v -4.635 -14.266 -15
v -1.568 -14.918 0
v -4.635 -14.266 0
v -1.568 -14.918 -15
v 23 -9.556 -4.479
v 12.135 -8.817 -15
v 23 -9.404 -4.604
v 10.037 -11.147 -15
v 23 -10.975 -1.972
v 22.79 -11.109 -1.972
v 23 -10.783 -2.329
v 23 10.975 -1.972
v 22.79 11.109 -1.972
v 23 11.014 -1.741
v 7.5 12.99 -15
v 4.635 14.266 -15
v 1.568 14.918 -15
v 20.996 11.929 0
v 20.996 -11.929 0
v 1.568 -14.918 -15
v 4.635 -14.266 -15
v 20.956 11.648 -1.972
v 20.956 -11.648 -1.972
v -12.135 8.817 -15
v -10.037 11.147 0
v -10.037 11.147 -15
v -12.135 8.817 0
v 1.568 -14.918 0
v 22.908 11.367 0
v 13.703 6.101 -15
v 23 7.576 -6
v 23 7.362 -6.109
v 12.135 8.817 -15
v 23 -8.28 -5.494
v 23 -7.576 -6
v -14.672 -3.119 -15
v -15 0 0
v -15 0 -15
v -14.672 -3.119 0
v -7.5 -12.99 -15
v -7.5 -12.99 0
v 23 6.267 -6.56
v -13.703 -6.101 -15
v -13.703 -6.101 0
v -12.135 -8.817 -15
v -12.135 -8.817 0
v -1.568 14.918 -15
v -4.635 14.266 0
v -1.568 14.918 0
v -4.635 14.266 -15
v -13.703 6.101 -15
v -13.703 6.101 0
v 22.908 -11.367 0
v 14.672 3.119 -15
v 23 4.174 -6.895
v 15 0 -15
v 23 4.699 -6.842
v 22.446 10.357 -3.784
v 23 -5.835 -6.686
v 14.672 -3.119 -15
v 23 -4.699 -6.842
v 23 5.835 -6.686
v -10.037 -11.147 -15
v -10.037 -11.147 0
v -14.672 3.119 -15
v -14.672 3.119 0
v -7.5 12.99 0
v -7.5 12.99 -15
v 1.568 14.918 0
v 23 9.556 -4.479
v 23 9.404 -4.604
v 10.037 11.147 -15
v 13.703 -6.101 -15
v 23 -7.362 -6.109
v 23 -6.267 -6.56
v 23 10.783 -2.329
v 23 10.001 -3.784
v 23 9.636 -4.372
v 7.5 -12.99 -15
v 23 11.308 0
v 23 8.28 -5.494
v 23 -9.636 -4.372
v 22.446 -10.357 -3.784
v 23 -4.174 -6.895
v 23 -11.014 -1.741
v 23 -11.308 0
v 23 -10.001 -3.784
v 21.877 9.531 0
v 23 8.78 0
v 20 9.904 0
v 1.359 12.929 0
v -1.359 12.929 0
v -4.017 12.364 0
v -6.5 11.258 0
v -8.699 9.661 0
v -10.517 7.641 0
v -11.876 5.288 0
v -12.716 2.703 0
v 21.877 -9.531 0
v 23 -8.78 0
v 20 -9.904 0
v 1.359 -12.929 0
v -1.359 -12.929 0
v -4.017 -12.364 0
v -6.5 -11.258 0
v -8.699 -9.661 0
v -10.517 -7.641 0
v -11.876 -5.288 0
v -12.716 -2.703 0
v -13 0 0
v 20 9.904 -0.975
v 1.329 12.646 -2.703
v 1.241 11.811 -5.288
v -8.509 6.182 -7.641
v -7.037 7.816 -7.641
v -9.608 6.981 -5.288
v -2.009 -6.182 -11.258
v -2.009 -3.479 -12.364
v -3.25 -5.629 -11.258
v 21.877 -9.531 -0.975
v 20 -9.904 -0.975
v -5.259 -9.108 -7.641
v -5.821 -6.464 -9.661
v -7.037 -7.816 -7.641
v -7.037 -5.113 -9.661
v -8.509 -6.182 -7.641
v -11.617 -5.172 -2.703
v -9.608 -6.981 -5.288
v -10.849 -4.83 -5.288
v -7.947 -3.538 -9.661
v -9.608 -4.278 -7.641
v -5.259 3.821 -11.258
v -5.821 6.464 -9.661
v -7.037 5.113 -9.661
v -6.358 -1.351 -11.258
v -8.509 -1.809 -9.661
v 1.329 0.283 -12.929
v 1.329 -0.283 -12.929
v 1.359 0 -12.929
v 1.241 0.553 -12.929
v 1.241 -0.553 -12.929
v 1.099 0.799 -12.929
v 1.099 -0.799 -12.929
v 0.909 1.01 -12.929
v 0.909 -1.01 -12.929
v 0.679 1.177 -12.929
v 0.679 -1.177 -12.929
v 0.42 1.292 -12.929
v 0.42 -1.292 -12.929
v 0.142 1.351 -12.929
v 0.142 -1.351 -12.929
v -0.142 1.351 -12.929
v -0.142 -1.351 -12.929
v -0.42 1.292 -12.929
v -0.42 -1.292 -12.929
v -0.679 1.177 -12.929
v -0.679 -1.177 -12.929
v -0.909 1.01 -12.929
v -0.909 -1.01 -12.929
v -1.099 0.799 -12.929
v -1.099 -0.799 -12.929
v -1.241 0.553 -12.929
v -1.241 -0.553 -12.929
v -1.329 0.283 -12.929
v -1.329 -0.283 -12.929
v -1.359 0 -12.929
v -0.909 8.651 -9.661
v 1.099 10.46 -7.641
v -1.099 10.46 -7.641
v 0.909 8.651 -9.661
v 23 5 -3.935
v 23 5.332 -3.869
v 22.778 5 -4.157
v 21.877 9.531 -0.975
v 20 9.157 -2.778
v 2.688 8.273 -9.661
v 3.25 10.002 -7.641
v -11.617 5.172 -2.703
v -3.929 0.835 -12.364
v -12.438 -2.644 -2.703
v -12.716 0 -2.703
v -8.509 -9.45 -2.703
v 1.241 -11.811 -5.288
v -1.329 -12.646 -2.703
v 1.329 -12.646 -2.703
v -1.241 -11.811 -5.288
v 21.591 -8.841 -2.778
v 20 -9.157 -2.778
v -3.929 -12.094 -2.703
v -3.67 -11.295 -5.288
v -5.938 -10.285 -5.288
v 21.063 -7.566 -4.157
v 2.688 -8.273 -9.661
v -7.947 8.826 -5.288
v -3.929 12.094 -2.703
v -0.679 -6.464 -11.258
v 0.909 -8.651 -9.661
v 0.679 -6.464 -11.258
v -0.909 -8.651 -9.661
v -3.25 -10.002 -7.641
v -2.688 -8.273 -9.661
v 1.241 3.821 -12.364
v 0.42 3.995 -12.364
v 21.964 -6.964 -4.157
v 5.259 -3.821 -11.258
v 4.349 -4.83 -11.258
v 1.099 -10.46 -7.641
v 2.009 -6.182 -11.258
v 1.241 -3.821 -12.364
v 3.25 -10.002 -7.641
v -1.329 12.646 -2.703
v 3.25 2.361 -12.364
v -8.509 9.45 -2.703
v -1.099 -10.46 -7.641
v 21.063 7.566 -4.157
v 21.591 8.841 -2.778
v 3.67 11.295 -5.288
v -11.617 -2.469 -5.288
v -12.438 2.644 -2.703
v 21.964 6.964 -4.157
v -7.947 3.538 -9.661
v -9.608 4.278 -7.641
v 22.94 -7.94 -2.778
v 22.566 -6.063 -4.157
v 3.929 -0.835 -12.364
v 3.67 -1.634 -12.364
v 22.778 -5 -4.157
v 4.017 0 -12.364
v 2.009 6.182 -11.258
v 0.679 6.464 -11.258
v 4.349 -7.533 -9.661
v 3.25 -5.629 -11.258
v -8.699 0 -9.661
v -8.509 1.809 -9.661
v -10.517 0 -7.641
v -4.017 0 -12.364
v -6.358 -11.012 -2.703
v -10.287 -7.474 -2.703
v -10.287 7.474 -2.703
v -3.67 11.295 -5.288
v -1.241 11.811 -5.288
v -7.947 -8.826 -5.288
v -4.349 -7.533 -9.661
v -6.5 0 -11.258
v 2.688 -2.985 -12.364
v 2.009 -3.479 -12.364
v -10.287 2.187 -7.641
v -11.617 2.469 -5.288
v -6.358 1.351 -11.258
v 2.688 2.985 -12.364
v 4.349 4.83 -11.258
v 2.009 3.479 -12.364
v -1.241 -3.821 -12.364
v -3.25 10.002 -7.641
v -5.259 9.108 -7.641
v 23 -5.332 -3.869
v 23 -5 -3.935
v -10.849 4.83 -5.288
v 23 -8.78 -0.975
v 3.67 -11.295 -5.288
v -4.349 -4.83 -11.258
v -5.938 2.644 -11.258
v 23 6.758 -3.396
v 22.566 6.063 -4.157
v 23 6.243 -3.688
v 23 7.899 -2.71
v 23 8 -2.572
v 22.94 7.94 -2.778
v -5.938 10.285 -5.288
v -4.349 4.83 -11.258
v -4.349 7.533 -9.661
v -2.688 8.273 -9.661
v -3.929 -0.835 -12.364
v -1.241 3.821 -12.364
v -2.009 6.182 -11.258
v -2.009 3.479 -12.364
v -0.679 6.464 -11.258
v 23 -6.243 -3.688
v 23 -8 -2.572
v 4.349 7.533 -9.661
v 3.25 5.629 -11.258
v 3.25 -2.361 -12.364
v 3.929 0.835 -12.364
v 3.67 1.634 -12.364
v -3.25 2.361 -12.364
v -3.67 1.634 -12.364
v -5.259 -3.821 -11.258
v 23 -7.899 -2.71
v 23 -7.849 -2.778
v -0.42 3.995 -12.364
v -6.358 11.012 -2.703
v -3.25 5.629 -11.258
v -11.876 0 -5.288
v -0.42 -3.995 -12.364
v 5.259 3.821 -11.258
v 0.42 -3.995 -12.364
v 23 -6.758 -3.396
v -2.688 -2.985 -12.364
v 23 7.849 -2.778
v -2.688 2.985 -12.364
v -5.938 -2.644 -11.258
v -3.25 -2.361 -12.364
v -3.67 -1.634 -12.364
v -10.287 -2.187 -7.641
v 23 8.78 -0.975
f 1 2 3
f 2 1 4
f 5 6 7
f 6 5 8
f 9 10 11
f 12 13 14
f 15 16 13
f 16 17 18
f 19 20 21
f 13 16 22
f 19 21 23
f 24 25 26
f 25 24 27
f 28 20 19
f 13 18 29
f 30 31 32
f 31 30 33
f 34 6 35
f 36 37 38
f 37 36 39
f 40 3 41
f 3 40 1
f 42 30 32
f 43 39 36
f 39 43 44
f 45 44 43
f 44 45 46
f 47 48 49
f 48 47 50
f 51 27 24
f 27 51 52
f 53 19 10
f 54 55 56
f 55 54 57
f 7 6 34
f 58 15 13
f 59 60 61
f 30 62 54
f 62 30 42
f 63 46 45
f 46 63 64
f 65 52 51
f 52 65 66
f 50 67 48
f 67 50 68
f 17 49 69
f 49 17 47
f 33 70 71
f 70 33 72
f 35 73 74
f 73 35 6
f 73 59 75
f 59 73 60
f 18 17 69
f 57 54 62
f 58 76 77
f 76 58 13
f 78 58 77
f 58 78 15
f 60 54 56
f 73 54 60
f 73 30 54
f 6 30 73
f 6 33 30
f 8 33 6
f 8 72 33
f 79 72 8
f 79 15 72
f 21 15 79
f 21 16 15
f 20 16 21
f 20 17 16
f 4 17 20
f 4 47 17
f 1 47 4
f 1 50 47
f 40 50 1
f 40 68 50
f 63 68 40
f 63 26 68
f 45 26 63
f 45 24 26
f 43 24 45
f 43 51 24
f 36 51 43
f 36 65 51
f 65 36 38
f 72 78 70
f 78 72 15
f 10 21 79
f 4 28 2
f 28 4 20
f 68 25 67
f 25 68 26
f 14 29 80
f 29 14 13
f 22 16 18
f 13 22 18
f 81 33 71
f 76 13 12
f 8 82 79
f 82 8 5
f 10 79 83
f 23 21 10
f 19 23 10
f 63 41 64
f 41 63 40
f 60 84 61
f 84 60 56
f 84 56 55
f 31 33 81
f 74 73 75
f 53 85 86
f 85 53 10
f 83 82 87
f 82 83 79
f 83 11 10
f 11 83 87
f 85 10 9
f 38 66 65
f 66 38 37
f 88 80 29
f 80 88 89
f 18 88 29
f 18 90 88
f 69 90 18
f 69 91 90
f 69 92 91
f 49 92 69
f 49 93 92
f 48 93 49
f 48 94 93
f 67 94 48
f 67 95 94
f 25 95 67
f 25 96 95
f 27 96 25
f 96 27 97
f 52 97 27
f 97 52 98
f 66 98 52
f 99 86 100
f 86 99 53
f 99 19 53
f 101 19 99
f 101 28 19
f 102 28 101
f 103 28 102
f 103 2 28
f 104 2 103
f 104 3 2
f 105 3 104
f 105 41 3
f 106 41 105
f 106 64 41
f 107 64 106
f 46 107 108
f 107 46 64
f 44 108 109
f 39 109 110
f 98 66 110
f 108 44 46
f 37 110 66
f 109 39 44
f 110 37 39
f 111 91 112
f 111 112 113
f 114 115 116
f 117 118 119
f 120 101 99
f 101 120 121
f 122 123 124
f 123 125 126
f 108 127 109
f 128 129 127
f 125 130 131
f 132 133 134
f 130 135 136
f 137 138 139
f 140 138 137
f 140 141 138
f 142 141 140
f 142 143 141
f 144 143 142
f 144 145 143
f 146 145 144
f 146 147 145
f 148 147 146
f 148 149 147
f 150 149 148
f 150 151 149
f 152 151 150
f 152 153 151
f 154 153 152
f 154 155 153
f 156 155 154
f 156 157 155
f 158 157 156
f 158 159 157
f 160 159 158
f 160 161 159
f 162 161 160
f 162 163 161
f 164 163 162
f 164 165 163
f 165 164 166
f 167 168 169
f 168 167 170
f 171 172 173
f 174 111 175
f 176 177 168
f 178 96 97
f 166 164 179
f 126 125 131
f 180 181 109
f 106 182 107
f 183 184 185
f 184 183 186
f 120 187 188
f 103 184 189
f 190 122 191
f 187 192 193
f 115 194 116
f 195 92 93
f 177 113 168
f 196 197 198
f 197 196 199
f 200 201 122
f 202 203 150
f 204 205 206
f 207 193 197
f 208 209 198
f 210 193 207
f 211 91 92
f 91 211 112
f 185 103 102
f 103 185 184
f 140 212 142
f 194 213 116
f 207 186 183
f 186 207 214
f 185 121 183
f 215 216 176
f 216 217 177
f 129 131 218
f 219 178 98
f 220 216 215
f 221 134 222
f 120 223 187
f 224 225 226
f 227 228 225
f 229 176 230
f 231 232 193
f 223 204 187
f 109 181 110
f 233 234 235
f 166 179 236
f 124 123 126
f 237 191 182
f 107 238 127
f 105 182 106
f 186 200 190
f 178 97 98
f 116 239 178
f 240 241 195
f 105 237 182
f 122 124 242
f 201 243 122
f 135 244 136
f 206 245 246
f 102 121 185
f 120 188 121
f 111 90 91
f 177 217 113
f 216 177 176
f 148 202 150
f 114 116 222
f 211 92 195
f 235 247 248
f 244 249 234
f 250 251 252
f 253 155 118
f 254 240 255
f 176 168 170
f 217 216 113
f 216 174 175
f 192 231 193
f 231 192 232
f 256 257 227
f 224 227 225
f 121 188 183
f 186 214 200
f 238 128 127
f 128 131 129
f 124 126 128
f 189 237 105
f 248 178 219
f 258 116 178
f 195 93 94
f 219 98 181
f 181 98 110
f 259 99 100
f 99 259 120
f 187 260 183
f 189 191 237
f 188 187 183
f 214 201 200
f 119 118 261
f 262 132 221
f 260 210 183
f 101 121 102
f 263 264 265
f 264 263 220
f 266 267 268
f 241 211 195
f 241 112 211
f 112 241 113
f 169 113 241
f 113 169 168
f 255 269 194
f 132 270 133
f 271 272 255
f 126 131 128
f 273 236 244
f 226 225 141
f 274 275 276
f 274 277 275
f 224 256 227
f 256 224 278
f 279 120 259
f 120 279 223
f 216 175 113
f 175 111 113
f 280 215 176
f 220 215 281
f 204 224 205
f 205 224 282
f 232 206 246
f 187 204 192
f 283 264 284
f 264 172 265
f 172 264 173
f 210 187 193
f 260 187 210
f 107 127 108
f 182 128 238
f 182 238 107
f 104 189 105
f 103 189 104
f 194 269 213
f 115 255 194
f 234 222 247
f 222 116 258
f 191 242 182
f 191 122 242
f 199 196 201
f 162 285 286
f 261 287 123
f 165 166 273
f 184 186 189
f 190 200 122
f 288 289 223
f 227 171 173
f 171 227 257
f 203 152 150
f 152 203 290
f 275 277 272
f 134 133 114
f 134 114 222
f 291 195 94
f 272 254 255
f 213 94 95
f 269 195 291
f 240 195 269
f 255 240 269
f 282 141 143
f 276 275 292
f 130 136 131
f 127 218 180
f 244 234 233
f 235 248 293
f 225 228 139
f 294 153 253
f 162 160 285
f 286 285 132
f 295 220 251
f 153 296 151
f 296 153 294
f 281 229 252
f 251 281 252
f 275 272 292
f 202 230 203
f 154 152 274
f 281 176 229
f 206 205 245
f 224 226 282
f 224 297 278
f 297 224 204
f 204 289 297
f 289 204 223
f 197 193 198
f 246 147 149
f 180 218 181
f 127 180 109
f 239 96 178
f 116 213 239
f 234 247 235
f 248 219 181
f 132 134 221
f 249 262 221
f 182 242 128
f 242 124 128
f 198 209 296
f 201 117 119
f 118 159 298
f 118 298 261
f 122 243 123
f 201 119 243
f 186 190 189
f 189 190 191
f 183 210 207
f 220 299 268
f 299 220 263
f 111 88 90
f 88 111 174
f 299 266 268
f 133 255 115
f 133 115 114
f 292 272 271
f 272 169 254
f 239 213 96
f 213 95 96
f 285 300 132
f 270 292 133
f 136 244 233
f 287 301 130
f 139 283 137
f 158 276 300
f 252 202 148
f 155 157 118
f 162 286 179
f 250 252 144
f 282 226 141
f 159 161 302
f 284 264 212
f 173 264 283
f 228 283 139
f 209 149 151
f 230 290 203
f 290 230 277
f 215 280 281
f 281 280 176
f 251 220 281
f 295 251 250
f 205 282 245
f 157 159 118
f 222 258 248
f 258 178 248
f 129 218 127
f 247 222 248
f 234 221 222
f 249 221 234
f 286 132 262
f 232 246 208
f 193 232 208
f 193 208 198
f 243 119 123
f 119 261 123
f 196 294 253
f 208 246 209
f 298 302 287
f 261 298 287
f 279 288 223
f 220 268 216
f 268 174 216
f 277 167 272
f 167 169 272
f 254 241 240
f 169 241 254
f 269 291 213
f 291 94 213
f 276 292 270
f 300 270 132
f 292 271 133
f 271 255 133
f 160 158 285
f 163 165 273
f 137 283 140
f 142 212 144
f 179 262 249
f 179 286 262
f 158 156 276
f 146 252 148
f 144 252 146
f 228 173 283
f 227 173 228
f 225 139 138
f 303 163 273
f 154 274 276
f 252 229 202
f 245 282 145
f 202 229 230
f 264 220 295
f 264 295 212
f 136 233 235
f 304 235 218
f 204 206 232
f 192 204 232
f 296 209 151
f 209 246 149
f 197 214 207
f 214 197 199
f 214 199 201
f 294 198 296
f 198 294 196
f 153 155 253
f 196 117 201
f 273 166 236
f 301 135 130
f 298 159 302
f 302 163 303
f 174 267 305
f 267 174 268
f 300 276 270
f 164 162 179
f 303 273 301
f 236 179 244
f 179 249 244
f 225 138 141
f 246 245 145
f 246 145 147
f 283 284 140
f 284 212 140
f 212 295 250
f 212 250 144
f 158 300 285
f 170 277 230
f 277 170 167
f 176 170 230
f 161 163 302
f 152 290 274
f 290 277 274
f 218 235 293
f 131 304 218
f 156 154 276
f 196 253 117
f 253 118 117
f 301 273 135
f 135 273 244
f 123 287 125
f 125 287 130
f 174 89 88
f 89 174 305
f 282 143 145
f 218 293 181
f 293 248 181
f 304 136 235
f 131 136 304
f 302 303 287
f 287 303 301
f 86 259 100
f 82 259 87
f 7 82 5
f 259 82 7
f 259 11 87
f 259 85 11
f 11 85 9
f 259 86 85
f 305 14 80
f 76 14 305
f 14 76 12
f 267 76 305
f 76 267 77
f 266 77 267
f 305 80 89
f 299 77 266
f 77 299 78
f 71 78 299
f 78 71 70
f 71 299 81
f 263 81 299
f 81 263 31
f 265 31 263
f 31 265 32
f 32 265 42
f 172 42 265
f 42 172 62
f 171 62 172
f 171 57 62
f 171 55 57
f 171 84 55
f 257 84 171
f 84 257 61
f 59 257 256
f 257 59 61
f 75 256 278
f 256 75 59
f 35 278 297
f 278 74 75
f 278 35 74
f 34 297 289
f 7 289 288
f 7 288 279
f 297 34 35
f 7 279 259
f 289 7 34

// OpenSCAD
//$fn = 90;

r1 = 15.0;
d1 = 2.0;
r2 = 7;
x2 = 5;
y2 = 10;

difference() {
    hull() {
        sphere(r=r1);
        translate([r1+x2, y2/2, 0]) {
            sphere(r=r2);
        }
        translate([r1+x2, -y2/2, 0]) {
            sphere(r=r2);
        }
        translate([0, 0, -r1])
            cylinder(h=1, r=r1);
    }

    translate([-r1, -r1, 0]) cube([r1*2+x2+r2, r1*2, r1*2]);

    hull() {
        sphere(r=r1-d1);
        translate([r1+x2, y2/2, 0]) {
            sphere(r=r2-d1);
        }
        translate([r1+x2, -y2/2, 0]) {
            sphere(r=r2-d1);
        }
    }

    translate([r1+x2+r2-d1*2, -r1, -r1]) cube([d1*2, r1*2, r1*2]);
}
